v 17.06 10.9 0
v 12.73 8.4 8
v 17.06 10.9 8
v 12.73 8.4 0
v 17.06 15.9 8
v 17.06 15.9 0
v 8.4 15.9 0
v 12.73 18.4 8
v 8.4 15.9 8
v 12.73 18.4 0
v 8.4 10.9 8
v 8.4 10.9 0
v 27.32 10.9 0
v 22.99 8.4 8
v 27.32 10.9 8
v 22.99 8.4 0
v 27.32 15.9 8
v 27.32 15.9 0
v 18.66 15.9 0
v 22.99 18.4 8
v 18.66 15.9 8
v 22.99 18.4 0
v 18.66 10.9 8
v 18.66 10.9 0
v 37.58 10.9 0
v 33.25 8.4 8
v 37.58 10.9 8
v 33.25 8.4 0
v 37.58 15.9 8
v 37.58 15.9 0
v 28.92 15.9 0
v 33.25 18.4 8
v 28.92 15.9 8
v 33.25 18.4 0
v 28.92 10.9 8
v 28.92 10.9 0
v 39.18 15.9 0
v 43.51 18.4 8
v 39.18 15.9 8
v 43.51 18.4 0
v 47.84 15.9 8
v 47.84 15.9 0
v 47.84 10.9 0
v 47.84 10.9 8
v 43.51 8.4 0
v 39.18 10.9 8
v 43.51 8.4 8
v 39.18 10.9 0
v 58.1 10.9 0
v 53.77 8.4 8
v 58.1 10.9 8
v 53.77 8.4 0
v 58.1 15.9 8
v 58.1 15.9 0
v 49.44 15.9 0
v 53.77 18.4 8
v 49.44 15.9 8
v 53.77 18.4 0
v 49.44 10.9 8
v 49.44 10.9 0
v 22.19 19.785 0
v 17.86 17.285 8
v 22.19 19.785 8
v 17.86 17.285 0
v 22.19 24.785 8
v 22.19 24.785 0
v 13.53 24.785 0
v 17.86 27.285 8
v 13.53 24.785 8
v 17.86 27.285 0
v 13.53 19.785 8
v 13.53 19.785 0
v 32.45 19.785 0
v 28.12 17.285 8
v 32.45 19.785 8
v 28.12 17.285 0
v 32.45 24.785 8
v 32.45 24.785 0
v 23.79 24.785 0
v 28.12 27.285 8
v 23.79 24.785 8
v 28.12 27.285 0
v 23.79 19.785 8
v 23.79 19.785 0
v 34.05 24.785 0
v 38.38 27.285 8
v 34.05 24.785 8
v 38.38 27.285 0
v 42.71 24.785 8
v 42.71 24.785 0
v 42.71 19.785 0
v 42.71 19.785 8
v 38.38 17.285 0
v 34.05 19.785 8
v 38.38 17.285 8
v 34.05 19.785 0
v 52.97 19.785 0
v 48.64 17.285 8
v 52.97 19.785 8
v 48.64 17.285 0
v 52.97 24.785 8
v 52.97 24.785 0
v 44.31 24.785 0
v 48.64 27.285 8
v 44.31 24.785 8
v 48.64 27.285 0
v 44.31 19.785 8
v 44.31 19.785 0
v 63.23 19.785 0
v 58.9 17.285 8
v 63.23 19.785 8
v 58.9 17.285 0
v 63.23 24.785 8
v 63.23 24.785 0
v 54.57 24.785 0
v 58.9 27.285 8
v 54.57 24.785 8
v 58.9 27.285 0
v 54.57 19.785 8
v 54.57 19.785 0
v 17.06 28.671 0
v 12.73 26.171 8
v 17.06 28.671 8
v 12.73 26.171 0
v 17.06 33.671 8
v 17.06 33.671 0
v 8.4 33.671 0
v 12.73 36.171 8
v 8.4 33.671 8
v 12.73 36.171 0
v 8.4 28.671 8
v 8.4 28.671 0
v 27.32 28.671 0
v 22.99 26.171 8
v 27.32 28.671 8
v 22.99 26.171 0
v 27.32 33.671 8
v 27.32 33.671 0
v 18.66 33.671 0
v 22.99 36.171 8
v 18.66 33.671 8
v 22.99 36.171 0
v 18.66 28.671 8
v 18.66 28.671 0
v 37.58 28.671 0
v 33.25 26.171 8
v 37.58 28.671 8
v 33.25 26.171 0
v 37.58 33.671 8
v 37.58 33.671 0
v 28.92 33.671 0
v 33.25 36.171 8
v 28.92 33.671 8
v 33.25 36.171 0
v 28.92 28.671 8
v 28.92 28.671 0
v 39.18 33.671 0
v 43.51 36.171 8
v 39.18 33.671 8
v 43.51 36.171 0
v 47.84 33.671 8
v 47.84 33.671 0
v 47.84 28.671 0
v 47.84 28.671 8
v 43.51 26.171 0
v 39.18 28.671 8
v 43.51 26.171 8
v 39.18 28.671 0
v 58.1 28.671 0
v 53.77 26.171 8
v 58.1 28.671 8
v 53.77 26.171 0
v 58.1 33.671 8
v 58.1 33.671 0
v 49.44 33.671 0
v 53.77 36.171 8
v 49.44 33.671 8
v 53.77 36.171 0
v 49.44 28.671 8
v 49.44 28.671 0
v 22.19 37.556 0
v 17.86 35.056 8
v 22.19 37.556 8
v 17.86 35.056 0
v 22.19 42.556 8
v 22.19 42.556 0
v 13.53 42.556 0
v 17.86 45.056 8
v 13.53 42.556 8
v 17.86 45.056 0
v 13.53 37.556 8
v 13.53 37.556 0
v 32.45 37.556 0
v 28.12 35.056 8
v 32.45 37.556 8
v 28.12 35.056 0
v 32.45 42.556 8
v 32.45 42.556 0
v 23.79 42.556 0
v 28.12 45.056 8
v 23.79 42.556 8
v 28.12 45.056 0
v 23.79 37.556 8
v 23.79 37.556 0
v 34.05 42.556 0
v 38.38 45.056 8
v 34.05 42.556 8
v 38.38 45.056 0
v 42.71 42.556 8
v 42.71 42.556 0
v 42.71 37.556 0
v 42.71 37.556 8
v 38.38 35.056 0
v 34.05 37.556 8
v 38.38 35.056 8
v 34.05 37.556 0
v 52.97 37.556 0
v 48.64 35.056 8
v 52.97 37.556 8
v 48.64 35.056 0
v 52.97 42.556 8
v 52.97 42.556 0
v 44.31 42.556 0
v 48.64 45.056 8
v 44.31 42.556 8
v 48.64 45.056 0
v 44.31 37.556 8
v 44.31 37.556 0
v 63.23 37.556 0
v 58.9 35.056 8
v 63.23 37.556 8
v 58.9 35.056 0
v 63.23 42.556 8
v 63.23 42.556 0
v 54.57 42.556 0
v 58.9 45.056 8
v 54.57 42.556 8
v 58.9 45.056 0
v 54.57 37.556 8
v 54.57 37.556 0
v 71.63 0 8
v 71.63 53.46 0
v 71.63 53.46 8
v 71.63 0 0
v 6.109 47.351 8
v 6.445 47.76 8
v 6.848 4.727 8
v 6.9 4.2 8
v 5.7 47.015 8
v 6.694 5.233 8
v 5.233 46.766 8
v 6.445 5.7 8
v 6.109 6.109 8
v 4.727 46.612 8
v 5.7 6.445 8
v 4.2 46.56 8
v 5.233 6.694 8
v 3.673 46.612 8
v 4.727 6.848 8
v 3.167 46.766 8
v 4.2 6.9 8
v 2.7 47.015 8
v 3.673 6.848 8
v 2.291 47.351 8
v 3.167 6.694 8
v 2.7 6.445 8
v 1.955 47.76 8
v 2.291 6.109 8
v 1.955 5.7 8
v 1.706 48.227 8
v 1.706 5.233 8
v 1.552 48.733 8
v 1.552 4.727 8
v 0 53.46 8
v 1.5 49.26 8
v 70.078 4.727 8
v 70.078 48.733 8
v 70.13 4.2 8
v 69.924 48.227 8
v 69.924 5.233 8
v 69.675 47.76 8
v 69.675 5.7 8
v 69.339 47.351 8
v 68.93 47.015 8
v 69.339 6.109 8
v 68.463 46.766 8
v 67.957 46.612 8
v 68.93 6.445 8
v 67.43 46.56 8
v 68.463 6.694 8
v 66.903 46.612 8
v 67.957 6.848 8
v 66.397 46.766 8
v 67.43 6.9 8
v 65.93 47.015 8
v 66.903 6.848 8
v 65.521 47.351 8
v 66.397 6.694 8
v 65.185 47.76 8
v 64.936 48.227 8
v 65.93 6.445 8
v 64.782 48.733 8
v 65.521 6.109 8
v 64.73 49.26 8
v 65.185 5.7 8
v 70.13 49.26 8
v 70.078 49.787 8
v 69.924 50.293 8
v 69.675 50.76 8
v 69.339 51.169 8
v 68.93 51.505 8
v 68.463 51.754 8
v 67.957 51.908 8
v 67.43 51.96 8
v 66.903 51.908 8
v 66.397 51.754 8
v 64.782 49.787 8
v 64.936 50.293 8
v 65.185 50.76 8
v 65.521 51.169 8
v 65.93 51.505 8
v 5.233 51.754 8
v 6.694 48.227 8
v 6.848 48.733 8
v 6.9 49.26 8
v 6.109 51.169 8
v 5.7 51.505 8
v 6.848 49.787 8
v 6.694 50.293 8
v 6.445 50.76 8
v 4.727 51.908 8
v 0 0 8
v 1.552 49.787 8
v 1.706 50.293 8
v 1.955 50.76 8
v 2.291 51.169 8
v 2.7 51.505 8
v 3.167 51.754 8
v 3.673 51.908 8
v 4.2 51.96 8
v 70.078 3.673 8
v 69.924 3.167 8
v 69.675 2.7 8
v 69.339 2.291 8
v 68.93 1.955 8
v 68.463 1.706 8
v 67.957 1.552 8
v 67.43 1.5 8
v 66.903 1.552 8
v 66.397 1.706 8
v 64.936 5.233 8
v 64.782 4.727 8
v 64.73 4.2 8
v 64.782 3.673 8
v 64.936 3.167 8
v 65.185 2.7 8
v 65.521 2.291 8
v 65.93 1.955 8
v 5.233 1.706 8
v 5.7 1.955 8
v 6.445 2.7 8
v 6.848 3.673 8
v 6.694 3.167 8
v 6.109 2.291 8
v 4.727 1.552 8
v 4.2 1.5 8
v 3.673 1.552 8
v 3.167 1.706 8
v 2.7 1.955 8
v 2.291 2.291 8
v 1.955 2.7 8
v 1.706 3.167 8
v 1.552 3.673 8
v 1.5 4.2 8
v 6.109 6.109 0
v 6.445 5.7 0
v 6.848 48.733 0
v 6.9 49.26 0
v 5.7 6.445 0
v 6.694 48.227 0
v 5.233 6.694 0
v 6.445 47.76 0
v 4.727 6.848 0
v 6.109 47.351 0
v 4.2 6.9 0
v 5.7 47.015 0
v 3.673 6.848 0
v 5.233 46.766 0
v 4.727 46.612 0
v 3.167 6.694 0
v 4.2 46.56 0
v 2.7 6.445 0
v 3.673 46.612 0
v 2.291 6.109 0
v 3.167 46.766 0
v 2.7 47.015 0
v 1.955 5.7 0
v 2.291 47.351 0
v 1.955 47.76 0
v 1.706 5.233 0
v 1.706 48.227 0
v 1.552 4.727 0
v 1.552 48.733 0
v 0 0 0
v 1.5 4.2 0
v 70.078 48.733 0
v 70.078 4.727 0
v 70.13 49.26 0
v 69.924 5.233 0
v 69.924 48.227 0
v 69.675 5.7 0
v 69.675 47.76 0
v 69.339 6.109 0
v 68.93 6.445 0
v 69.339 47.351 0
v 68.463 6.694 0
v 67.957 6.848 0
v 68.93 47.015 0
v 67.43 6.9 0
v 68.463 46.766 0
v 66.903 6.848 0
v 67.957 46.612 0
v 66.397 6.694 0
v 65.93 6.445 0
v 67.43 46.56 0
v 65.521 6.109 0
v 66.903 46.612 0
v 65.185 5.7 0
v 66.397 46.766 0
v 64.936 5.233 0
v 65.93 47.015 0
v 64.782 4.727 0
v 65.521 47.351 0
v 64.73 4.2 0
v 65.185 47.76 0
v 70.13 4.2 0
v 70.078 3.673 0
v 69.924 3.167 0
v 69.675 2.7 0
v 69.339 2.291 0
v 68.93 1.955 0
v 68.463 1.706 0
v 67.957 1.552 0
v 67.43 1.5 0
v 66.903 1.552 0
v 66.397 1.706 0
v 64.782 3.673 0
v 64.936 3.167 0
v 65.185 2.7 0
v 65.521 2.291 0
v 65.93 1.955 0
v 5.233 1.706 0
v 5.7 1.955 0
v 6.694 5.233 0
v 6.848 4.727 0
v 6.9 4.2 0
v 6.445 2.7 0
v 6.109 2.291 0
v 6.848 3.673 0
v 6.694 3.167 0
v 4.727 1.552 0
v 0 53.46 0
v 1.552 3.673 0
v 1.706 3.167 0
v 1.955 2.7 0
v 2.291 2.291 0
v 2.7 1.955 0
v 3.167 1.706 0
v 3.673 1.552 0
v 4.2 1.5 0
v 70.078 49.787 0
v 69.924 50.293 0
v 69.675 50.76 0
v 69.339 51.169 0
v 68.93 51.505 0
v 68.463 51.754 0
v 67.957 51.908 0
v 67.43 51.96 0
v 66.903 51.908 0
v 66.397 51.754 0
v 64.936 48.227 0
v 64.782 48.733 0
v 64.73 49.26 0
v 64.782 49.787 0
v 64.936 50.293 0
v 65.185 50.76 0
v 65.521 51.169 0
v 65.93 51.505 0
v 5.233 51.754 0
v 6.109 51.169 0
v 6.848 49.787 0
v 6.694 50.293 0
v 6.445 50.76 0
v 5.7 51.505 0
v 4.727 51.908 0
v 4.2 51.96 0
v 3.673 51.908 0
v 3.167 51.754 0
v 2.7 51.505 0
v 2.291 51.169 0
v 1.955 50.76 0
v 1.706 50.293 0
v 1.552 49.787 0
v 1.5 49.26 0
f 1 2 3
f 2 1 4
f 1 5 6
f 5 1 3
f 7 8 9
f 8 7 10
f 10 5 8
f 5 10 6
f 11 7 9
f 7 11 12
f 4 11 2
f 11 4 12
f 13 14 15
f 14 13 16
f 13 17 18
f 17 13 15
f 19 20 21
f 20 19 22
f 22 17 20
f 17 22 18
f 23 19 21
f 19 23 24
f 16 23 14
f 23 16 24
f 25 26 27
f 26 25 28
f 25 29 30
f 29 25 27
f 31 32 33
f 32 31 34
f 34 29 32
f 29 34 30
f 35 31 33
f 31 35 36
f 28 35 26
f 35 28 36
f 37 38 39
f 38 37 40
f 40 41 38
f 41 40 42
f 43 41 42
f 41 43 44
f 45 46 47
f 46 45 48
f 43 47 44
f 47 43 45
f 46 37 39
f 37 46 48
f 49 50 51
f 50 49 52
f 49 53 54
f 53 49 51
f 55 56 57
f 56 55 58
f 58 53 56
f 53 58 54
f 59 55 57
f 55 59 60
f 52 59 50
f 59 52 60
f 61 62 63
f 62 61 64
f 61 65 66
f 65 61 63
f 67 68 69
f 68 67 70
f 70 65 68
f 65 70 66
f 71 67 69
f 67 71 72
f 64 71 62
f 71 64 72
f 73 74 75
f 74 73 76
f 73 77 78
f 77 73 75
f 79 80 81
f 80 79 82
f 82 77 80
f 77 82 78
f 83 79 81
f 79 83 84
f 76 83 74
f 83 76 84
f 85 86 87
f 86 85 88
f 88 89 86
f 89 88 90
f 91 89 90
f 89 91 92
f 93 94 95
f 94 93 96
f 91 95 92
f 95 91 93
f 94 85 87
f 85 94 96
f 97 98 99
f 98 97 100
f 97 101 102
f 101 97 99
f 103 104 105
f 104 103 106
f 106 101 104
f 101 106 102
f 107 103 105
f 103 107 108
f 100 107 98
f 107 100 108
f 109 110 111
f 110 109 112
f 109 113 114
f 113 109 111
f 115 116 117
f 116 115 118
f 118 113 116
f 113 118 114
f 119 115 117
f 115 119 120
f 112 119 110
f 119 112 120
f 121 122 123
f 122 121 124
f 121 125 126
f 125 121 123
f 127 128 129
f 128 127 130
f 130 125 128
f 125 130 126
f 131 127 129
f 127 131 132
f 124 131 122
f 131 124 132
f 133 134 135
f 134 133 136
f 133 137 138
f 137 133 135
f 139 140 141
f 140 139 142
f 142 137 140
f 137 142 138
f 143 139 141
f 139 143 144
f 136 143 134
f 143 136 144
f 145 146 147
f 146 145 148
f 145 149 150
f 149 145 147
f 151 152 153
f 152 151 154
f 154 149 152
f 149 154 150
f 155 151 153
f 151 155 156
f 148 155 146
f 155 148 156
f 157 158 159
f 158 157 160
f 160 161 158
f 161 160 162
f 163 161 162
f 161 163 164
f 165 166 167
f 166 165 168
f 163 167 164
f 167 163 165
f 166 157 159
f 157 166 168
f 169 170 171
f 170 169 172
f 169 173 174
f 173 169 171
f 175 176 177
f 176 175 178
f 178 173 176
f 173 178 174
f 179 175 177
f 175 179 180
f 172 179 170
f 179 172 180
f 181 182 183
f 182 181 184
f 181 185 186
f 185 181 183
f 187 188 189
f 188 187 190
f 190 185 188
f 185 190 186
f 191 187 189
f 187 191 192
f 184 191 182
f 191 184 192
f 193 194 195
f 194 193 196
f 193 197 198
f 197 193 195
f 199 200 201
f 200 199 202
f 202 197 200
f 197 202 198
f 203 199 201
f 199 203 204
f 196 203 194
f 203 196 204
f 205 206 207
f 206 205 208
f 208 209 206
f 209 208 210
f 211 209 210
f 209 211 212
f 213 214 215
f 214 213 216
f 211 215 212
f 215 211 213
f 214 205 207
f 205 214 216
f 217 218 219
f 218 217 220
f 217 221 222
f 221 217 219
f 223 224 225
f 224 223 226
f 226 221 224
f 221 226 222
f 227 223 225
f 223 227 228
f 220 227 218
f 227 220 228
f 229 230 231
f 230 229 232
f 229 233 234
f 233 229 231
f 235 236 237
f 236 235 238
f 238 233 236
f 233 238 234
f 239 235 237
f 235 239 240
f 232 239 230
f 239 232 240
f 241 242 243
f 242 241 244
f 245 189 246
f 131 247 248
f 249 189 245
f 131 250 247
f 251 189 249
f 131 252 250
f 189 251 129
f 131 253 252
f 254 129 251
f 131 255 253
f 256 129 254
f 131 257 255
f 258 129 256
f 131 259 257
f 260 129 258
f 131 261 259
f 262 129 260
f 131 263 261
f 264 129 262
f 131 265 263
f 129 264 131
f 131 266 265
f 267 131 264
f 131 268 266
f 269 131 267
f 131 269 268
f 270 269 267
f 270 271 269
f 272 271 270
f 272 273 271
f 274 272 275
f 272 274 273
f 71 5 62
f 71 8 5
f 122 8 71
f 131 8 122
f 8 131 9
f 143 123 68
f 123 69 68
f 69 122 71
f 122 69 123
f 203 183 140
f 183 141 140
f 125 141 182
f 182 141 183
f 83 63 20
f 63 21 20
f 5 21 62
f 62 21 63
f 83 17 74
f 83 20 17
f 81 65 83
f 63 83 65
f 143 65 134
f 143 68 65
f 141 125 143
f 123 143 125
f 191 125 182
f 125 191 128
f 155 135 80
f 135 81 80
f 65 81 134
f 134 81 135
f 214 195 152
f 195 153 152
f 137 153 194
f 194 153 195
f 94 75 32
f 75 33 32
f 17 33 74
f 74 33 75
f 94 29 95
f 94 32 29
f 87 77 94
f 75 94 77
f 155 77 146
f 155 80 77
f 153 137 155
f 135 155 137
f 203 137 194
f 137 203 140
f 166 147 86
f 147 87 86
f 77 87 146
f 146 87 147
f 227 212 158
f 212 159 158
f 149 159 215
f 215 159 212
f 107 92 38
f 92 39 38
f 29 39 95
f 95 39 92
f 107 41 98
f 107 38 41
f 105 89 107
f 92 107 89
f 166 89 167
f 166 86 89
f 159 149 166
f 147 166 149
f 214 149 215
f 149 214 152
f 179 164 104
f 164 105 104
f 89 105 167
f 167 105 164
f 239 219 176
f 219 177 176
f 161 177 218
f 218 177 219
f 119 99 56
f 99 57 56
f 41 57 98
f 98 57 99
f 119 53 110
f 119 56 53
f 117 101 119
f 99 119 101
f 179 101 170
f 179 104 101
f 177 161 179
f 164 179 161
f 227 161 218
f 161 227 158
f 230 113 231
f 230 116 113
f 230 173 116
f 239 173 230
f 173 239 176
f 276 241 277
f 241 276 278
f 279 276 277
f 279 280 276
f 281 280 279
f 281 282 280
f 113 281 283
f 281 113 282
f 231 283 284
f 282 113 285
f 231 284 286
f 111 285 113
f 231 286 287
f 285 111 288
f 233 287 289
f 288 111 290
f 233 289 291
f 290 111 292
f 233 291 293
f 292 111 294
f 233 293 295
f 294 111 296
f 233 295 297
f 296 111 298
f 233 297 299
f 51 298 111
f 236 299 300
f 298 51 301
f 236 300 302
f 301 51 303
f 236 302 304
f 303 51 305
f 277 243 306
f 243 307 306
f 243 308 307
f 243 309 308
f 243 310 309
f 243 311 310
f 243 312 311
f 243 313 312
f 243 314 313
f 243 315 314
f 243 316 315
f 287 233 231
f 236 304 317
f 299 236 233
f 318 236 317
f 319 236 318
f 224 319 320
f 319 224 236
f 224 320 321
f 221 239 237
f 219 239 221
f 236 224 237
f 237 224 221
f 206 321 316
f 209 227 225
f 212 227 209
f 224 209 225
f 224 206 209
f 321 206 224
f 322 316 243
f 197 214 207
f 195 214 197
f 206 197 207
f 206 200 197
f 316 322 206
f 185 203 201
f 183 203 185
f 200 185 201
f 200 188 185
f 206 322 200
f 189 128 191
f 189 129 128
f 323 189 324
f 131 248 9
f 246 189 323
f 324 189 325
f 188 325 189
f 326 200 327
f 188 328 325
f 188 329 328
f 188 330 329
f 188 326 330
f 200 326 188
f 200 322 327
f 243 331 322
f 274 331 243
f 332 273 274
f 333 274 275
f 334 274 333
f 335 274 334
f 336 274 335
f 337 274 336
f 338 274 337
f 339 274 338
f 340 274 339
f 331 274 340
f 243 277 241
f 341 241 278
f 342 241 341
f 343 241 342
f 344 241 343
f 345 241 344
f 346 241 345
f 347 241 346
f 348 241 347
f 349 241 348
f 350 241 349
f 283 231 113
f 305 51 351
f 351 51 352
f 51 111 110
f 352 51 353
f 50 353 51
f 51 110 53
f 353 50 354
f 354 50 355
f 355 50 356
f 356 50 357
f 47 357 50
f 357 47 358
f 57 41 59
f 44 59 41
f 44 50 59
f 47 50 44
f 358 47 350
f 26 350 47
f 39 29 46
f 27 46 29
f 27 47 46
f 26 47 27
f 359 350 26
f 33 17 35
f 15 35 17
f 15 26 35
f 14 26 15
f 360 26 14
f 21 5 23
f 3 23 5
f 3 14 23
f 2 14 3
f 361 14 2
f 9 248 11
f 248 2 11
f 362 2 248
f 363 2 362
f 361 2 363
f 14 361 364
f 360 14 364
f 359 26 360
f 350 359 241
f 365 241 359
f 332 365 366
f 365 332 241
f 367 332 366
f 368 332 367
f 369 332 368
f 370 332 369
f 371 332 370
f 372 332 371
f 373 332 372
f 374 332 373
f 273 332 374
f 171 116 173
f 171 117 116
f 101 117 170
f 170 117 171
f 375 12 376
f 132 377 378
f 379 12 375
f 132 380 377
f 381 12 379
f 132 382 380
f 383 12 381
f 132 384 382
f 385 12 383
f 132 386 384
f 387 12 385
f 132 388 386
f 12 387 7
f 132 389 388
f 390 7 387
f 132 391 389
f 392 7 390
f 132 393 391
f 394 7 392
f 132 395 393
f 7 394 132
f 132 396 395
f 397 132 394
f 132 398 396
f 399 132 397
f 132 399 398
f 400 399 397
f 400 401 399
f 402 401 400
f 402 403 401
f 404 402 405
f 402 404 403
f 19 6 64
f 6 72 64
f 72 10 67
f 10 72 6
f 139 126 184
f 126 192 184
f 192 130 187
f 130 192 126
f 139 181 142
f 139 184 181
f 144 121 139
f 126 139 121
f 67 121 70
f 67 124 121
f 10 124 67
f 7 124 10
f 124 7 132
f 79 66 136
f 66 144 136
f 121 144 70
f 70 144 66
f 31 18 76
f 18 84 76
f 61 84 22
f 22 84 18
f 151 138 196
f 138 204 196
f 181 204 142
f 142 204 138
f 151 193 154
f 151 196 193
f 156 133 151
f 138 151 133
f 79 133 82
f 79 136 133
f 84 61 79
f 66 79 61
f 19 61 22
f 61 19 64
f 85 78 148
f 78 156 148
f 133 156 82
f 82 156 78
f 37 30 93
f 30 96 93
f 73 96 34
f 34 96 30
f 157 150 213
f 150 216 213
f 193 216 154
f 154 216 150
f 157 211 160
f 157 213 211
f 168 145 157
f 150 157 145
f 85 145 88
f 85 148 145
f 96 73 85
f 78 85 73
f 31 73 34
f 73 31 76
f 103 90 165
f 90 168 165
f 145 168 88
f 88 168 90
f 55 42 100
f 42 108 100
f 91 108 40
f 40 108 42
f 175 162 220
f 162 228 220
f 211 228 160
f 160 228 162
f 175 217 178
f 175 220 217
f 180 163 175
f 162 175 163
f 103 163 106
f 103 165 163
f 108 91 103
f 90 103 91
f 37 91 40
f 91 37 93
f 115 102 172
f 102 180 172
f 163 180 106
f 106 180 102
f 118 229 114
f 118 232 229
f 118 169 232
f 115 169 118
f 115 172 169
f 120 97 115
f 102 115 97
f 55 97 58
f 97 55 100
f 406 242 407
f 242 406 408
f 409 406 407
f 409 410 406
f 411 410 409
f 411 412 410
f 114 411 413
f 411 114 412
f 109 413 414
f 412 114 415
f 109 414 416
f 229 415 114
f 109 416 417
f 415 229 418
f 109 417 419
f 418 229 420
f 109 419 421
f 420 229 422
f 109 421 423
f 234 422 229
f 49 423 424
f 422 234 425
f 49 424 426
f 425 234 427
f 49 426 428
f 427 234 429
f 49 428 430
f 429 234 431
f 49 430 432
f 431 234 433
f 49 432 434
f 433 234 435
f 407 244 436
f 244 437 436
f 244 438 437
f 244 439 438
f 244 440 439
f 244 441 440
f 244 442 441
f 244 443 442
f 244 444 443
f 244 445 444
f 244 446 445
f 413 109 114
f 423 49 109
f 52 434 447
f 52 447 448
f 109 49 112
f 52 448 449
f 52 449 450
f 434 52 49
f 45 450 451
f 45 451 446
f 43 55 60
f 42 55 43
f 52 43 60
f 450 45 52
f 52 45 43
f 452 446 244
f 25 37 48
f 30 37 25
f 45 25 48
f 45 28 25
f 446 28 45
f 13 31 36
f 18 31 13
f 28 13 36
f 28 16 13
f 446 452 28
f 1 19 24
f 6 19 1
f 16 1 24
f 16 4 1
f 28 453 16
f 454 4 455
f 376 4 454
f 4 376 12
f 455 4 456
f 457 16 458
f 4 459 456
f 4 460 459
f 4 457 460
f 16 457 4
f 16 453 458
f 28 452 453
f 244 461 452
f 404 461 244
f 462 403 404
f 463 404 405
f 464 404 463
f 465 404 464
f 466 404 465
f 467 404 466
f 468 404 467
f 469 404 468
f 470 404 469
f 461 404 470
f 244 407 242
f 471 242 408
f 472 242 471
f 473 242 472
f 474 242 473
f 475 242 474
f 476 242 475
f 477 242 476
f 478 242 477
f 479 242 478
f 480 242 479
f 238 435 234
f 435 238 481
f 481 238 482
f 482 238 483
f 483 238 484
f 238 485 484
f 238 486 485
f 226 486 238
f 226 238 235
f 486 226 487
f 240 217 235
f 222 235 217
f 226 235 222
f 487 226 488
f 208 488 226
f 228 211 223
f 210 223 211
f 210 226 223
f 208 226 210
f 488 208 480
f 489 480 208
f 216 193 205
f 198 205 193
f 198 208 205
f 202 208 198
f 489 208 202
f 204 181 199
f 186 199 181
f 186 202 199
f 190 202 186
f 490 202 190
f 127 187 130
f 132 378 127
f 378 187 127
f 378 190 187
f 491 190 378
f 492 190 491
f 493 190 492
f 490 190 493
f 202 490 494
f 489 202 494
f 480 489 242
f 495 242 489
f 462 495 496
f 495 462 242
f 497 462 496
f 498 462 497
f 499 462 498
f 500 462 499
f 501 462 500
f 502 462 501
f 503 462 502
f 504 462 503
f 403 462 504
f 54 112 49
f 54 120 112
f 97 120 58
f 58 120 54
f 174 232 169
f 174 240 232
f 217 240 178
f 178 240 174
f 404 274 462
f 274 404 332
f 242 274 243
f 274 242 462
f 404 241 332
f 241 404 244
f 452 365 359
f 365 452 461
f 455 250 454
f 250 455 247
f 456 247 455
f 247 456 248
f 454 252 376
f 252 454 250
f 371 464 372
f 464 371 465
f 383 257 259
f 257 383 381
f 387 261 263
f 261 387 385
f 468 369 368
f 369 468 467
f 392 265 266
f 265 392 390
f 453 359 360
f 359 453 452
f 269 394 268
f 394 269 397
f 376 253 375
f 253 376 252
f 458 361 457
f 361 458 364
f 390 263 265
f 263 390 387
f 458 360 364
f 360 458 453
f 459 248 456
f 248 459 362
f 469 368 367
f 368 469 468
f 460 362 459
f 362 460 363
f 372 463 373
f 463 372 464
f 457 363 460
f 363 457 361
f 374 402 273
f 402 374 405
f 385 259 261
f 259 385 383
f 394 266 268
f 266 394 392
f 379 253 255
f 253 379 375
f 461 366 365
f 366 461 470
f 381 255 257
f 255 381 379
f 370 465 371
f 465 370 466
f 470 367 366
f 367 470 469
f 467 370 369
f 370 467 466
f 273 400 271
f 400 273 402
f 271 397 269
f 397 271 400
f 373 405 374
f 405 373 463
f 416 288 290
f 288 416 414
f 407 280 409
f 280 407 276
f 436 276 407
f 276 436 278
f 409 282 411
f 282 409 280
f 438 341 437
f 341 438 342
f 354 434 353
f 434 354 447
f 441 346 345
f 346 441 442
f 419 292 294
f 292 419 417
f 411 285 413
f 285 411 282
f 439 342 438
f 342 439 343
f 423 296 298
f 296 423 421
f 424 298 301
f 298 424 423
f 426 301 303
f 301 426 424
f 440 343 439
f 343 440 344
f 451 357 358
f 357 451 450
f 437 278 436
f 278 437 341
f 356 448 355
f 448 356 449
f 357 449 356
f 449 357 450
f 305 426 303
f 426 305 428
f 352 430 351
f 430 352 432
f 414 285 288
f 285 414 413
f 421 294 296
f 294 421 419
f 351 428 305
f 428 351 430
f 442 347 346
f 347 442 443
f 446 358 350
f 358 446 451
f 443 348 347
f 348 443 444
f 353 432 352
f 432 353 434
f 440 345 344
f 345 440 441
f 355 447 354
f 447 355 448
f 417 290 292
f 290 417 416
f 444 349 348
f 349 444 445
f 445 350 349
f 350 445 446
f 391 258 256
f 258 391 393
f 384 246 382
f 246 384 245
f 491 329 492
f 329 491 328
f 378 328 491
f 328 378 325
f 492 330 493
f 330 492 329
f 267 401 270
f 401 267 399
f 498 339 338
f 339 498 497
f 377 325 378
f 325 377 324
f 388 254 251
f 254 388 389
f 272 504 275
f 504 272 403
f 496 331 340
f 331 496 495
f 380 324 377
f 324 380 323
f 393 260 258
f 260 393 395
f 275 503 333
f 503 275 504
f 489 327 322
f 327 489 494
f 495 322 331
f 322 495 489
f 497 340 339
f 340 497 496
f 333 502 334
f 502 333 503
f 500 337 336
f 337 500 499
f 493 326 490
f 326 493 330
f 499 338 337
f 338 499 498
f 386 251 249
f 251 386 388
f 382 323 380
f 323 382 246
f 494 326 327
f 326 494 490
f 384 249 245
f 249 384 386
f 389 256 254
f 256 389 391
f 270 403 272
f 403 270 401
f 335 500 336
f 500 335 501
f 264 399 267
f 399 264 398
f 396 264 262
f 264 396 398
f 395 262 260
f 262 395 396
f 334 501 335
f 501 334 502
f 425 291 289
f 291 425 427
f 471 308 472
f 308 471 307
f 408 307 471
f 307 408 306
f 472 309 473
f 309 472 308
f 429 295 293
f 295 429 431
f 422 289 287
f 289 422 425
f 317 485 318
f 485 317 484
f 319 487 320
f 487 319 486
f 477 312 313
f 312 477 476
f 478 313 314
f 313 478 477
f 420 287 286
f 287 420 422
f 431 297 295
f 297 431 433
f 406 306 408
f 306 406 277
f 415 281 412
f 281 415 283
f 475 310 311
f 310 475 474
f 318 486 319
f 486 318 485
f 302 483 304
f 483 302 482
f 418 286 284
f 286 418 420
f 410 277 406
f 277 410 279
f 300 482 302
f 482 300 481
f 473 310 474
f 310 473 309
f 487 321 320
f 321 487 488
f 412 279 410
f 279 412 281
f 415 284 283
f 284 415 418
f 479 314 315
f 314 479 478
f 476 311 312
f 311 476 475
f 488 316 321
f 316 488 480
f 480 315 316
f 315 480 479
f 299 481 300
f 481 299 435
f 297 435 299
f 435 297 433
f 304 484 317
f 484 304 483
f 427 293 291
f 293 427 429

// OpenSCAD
$fn = 32;

// ----------------------------------------------------------------------
// Honeycomb panel: 71.63 x 53.46 mm, 20 cells of 10 mm
// ----------------------------------------------------------------------

// --- parameters (mm) ---
panel_w = 71.63;          // panel width
panel_d = 53.46;          // panel depth
thick = 8;                // panel thickness
cell_r = 5;               // hex cell circumradius
pitch = 10.26;            // hex cell pitch (centre to centre)
web = 1.6;                // web between the cells
columns = 5;              // columns of cells
rows = 4;                 // rows of cells
cell_count = 20;          // total cells
shift_x = 12.73;          // first cell offset in x
shift_y = 13.4;           // first cell offset in y
mount_d = 5.4;            // corner mounting holes
hole_off = 4.2;           // mounting hole offset from the corners

difference() {
  union() {
    cube([panel_w, panel_d, thick]);
  }
  /* hexagonal cells, point-up, cut right through the plate */
  for (row = [0 : rows - 1]) {
    for (col = [0 : columns - 1]) {
      translate([shift_x + col * pitch + (row % 2) * pitch / 2, shift_y + row * pitch * 0.866025, -2.5]) rotate([0, 0, 30]) cylinder(h = thick + 5, d = 2 * cell_r, $fn = 6);
    }
  }
  /* corner mounting holes, clear of the outer cell web */
  translate([4.2, 4.2, -2.5]) cylinder(h = thick + 5, d = mount_d);
  translate([67.43, 4.2, -2.5]) cylinder(h = thick + 5, d = mount_d);
  translate([4.2, 49.26, -2.5]) cylinder(h = thick + 5, d = mount_d);
  translate([67.43, 49.26, -2.5]) cylinder(h = thick + 5, d = mount_d);
}
